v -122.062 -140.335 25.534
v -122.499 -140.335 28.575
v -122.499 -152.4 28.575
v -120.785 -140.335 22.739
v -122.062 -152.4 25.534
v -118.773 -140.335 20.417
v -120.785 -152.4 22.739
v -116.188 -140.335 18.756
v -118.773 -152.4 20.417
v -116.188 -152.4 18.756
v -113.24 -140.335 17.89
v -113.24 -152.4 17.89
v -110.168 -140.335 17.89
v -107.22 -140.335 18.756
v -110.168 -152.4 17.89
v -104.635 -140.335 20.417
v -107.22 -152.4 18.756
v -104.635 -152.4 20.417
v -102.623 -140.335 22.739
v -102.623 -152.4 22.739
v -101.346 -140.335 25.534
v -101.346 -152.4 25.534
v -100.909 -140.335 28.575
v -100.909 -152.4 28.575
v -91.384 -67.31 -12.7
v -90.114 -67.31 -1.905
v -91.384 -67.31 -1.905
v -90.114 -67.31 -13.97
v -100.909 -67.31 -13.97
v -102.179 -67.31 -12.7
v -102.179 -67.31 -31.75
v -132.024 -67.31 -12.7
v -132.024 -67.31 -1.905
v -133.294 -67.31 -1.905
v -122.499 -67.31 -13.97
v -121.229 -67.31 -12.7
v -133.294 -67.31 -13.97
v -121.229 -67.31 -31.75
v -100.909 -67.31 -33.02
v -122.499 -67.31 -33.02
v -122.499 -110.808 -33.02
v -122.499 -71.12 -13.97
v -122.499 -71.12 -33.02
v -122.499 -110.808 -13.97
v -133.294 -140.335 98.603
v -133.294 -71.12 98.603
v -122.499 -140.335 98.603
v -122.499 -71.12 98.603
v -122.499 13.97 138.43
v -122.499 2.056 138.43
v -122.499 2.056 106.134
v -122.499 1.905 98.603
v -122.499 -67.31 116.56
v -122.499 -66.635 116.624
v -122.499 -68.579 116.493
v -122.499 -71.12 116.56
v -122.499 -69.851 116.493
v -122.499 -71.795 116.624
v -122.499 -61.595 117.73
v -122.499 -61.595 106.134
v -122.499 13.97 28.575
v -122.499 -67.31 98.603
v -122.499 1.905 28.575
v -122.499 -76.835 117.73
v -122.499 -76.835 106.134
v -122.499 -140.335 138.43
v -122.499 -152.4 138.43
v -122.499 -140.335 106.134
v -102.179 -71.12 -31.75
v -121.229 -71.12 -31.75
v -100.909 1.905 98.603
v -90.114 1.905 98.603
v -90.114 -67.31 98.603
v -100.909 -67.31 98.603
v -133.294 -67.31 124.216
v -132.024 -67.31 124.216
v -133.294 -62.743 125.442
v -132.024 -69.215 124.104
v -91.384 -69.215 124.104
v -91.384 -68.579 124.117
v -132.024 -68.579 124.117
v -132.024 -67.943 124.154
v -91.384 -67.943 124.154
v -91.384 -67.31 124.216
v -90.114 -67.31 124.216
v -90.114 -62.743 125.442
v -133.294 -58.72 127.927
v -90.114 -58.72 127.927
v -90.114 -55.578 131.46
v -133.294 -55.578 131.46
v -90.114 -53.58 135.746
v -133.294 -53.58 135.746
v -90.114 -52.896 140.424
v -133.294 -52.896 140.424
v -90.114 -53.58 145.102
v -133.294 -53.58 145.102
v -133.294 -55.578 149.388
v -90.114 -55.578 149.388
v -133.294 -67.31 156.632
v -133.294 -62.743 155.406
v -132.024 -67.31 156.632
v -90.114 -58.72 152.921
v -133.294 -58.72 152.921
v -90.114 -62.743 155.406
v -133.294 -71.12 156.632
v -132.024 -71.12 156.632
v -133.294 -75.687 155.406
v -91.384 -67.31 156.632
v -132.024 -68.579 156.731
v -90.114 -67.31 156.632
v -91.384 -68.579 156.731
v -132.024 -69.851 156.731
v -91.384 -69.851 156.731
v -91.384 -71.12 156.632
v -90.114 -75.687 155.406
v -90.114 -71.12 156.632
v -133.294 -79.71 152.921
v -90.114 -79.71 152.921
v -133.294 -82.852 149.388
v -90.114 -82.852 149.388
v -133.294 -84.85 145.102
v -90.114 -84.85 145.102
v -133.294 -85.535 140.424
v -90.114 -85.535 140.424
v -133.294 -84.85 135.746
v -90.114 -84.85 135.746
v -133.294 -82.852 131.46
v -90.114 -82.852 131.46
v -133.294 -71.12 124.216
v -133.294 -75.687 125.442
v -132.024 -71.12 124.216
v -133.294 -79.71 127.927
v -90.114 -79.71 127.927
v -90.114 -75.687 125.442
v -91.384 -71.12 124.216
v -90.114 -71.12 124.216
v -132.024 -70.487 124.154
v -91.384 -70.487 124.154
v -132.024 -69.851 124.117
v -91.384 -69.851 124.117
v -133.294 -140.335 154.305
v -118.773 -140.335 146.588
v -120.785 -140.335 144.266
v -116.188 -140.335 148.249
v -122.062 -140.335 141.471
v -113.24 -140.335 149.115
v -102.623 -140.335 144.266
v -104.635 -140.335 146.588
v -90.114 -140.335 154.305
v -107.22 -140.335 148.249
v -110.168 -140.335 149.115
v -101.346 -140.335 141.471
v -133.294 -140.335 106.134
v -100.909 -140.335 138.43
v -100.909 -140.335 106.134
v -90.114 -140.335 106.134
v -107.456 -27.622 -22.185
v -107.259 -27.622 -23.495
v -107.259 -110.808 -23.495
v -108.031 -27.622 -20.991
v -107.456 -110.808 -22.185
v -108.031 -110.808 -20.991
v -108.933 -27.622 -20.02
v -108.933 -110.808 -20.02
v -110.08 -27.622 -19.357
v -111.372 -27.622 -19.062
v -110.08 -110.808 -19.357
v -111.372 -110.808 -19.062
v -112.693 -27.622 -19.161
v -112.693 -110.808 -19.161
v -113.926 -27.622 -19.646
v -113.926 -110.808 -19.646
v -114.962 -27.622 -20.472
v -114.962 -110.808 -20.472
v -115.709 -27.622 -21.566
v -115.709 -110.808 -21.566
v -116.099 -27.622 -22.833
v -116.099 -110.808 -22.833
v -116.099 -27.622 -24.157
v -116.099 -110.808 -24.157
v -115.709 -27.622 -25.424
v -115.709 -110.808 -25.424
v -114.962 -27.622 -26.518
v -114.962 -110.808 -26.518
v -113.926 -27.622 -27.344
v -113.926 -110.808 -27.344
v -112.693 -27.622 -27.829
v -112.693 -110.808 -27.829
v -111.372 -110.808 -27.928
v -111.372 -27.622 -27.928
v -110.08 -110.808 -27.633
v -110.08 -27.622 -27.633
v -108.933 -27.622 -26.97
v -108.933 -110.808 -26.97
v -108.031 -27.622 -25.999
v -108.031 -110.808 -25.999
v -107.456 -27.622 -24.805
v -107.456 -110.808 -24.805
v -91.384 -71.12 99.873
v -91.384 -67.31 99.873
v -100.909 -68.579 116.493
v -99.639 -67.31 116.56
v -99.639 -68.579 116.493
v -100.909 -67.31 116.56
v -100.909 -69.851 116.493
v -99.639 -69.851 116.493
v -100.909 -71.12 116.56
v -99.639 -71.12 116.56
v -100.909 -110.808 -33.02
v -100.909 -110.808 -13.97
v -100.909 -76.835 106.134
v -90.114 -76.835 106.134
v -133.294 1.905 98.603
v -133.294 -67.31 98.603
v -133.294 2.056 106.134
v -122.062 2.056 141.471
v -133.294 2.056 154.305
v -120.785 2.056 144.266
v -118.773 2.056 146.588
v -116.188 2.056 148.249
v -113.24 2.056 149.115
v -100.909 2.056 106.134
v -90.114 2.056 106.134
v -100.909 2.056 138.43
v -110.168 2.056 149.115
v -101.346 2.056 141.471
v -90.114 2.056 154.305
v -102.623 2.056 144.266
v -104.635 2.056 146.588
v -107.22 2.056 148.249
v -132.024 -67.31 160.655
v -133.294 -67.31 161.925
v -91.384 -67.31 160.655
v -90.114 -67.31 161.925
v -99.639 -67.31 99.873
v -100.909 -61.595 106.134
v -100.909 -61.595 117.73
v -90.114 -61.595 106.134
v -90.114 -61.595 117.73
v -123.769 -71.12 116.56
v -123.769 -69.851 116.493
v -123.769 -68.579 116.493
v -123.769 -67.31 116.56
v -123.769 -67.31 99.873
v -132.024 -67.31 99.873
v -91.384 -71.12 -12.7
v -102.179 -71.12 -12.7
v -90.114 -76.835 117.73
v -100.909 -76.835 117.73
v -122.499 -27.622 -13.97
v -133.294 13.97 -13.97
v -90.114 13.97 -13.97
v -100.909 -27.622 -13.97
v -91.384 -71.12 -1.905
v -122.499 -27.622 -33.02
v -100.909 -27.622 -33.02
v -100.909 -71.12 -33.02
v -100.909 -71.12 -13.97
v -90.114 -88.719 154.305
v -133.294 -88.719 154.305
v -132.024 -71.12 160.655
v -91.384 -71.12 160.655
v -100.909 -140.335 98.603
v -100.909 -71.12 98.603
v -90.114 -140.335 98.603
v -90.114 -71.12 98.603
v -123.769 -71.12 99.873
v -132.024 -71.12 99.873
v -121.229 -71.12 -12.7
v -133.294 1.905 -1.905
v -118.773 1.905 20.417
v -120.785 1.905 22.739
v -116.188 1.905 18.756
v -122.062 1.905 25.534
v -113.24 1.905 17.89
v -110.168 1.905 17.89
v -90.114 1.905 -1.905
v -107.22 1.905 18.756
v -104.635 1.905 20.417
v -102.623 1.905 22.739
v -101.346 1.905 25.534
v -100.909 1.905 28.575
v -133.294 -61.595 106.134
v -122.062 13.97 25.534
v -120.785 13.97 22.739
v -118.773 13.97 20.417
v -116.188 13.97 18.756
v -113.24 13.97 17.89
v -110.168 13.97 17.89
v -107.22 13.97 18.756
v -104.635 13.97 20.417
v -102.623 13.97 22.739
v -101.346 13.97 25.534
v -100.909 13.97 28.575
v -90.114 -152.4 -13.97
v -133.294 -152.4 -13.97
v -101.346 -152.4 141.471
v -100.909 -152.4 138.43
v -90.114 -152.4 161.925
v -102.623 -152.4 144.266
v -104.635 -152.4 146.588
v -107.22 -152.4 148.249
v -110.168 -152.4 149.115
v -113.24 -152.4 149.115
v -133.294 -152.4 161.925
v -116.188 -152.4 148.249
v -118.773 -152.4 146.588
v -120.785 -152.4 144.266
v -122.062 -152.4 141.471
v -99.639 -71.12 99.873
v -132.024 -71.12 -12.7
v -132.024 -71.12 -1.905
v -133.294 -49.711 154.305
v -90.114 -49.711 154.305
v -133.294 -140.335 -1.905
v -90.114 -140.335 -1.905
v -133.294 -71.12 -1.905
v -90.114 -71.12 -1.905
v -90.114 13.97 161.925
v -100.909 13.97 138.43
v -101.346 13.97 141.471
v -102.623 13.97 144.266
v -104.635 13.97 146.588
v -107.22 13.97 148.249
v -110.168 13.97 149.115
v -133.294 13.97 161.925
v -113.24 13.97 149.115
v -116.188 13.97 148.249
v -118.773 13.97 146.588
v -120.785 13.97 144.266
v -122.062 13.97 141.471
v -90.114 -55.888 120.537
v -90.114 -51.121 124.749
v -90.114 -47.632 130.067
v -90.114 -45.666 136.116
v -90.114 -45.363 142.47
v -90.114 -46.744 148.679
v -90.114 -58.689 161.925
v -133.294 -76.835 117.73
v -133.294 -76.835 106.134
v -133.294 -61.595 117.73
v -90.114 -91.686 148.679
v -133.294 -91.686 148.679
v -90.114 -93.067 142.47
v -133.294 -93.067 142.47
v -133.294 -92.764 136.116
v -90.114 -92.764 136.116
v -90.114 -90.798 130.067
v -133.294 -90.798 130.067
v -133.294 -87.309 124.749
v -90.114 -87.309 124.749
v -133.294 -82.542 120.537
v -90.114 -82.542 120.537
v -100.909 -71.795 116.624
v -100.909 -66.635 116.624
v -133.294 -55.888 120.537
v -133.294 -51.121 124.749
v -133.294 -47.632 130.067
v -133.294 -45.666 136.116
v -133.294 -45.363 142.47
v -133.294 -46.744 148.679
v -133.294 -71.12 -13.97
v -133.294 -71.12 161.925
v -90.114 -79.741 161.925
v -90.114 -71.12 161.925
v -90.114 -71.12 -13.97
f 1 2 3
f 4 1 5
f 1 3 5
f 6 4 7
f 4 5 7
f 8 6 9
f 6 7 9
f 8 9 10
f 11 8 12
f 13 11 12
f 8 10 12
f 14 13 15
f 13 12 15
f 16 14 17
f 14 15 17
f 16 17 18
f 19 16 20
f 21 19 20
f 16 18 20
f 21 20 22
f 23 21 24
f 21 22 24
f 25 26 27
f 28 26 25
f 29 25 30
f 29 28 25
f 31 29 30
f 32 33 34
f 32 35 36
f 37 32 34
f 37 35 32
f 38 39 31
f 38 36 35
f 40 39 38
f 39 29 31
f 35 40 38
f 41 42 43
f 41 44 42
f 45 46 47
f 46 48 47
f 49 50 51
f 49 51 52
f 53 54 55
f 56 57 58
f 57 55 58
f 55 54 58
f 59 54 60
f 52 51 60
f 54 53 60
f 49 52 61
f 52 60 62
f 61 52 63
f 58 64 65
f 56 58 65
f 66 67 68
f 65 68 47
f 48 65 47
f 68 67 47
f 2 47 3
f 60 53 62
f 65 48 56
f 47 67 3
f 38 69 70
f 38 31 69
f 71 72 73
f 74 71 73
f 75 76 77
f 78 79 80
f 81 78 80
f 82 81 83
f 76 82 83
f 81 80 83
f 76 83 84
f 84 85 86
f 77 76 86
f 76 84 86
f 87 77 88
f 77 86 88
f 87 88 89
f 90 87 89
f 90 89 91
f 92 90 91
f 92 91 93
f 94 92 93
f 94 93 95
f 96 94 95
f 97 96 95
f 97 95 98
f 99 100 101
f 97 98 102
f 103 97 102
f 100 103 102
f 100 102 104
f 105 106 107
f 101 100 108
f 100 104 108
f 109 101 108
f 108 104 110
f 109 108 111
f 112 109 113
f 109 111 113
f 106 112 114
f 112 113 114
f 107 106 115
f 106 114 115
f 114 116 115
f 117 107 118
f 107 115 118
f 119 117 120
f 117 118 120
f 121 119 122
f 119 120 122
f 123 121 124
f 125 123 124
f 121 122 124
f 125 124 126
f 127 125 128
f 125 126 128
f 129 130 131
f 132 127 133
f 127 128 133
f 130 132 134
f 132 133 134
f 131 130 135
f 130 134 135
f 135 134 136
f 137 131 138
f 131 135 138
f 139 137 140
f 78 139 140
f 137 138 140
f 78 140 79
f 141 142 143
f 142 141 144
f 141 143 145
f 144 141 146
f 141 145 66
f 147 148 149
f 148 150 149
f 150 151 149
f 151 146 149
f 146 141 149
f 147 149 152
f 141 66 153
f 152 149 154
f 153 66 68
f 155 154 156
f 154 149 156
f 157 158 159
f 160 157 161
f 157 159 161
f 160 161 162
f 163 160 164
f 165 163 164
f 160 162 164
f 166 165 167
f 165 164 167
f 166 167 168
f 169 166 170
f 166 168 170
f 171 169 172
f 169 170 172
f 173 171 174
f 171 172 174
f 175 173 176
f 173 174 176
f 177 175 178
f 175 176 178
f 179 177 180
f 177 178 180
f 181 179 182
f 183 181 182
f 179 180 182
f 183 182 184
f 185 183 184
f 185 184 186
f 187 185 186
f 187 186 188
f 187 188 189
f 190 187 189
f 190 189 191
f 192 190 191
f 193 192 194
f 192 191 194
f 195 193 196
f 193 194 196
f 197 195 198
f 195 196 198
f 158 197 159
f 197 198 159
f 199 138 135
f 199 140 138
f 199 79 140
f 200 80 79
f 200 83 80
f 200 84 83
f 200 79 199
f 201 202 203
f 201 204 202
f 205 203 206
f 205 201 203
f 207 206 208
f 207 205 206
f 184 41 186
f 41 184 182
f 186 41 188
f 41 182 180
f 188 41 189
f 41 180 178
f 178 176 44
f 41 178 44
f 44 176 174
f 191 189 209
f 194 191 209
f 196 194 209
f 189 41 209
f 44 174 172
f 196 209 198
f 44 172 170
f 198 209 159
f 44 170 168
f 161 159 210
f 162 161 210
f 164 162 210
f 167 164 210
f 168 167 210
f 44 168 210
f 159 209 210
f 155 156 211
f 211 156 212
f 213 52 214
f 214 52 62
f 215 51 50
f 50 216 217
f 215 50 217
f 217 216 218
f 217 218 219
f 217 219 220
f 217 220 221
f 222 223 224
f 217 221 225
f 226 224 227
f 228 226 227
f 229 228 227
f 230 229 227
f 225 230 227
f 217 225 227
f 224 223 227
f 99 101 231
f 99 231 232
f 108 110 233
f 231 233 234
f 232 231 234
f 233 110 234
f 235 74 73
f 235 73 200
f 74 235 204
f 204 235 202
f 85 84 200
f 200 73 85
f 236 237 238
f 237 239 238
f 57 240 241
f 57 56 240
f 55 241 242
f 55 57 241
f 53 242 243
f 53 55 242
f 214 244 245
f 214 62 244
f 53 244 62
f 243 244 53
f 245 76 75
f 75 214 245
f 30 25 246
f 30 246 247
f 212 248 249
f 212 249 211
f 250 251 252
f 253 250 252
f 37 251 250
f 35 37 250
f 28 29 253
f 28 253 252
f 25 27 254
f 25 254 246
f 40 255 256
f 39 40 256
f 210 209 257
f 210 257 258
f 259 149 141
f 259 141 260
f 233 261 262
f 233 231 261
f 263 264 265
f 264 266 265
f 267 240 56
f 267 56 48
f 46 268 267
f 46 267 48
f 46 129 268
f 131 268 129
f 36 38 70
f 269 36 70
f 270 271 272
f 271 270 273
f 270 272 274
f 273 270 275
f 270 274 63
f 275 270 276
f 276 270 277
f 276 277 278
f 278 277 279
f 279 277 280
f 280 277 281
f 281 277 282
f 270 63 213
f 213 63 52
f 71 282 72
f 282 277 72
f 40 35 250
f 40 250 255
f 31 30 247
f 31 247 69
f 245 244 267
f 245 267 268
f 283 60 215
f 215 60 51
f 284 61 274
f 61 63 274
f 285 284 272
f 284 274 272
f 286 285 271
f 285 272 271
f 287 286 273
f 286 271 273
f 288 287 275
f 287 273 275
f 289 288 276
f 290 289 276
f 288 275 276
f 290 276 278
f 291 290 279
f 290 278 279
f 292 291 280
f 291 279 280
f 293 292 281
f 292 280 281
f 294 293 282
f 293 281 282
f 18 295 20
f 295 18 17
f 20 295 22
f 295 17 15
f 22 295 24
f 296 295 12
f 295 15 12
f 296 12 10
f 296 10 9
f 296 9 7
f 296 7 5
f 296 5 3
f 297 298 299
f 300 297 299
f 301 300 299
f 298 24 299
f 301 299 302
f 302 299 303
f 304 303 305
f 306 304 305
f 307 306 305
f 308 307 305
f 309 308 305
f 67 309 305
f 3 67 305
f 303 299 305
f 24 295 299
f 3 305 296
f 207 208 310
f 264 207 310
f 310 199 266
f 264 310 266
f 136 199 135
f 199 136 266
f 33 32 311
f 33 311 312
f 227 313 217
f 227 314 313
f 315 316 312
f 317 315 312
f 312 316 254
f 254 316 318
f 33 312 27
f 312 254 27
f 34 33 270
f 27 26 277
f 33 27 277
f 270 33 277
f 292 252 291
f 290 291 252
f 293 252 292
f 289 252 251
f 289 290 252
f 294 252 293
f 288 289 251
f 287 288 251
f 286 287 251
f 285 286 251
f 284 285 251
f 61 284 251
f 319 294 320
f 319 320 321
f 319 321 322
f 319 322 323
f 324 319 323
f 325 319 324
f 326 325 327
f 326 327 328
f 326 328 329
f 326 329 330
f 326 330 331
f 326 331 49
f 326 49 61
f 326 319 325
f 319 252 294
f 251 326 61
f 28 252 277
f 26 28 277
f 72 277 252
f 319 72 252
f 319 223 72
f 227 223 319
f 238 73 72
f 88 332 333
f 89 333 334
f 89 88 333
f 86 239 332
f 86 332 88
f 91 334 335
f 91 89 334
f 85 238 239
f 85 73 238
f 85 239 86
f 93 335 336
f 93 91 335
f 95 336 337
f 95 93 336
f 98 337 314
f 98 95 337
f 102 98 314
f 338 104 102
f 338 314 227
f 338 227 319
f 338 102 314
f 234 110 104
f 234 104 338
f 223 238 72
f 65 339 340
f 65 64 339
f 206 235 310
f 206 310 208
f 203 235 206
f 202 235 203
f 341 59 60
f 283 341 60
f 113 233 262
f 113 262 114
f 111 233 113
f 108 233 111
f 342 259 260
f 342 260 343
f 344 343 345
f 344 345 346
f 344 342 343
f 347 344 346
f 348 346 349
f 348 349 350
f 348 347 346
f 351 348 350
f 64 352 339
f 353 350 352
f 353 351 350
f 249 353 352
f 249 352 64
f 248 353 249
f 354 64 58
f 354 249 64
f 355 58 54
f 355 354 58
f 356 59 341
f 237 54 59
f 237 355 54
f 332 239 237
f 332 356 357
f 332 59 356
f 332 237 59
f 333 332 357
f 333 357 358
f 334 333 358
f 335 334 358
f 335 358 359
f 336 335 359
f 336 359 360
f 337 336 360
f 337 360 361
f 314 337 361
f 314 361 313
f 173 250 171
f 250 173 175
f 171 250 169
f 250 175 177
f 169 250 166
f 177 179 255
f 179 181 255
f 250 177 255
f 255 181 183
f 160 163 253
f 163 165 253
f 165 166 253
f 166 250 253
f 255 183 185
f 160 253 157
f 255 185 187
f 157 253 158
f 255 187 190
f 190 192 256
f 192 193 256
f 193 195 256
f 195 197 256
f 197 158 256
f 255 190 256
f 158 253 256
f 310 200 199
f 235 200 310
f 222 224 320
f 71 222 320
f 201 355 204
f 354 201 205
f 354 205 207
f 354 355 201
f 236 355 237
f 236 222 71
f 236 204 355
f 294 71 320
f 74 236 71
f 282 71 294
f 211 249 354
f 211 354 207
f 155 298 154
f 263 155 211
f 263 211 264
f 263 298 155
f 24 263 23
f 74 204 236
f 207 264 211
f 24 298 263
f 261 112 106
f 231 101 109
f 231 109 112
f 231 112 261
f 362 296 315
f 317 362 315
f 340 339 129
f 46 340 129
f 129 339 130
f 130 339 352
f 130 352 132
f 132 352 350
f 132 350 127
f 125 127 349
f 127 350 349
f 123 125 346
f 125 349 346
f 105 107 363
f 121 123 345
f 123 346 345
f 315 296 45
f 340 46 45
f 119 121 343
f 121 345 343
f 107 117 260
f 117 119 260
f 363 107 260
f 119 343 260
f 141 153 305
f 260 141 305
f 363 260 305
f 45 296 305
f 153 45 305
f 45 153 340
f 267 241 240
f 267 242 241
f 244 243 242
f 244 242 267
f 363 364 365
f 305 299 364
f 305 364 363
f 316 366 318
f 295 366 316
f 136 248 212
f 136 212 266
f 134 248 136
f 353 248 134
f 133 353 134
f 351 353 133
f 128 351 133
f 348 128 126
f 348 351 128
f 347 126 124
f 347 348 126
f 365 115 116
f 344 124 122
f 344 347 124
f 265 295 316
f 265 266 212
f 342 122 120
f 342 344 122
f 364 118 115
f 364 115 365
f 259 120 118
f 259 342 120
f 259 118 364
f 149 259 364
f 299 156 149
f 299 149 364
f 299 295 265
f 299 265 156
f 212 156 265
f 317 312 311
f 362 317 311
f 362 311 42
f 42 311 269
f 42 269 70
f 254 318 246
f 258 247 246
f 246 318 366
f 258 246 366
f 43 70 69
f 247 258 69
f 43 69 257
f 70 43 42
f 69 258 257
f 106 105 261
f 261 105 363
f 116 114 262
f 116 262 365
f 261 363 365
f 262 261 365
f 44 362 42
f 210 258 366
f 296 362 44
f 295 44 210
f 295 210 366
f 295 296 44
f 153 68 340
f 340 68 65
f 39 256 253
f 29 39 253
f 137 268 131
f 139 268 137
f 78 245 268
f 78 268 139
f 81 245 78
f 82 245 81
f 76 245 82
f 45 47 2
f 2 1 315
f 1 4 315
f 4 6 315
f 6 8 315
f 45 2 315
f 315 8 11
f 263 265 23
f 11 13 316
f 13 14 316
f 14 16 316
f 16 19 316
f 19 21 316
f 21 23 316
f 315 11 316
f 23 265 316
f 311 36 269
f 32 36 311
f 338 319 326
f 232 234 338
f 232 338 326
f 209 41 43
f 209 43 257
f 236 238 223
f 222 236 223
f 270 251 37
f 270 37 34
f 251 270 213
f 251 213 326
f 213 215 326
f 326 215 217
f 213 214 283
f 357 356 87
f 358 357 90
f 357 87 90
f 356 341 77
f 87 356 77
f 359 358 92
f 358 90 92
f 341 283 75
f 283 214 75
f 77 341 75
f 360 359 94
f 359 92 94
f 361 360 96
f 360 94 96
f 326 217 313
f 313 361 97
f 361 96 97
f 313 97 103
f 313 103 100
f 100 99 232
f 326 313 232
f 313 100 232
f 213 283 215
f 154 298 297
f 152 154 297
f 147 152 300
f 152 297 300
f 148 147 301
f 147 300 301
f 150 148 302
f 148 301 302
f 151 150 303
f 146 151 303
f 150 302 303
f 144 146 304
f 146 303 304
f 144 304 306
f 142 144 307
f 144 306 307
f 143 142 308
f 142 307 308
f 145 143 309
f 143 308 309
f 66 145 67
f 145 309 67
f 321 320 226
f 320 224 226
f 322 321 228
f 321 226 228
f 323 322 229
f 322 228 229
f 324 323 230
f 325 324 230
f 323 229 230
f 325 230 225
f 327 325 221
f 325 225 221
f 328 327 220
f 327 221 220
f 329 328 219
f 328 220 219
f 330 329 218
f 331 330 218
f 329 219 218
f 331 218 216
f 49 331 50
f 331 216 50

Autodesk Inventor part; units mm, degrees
ref_plane "YZ Plane" through (0, 0, 0) normal (1, 0, 0) x (0, 1, 0)
ref_plane "XZ Plane" through (0, 0, 0) normal (0, 1, 0) x (-1, 0, 0)
ref_plane "XY Plane" through (0, 0, 0) normal (0, 0, 1) x (1, 0, 0)
sketch "Sketch1" plane through (0, 0, 0) normal (0, 1, 0) x (-1, 0, 0)
  line L0 (920.75, 0) -> (0, 0)
  line L1 (0, 0) -> (920.75, 0)
  line L2 (-297.6389, 409.8513) -> (2710.7909, 409.8513) construction
  line L3 (2710.7909, 409.8513) -> (2710.7909, -1716.9746) construction
  line L4 (2710.7909, -1716.9746) -> (-297.6389, -1716.9746) construction
  line L5 (-297.6389, -1716.9746) -> (-297.6389, 409.8513) construction
  line L6 (0, 0) -> (920.75, 0)
  line L7 (920.75, 0) -> (920.75, 100.33)
  line L8 (0, 100.33) -> (920.75, 100.33)
  line L9 (0, 0) -> (0, 100.33)
  line L10 (0, 100.33) -> (0, 120.65)
  line L11 (0, 120.65) -> (920.75, 120.65)
  line L12 (920.75, 120.65) -> (920.75, 100.33)
  line L13 (0, 120.65) -> (0, 196.85)
  line L14 (920.75, 196.85) -> (920.75, 120.65)
  line L15 (477.9962, 0) -> (477.9962, -13.97)
  line L16 (477.9962, -13.97) -> (434.8162, -13.97)
  line L17 (434.8162, -13.97) -> (434.8162, 0)
  line L18 (133.294, 0) -> (133.294, -13.97)
  line L19 (133.294, -13.97) -> (90.114, -13.97)
  line L20 (90.114, -13.97) -> (90.114, 0)
  line L21 (769.0257, 0) -> (769.0257, -13.97)
  line L22 (769.0257, -13.97) -> (812.2057, -13.97)
  line L23 (812.2057, -13.97) -> (812.2057, 0)
  line L24 (434.8162, -13.97) -> (477.9962, -13.97)
  line L25 (769.0257, -13.97) -> (812.2057, -13.97)
  line L26 (90.114, -13.97) -> (133.294, -13.97)
  line L27 (90.114, -13.97) -> (111.704, -13.97)
  line L28 (111.704, -13.97) -> (100.909, -13.97)
  line L29 (100.909, -13.97) -> (122.499, -13.97)
  line L30 (122.499, -13.97) -> (122.499, -33.02)
  line L31 (122.499, -33.02) -> (100.909, -33.02)
  line L32 (100.909, -33.02) -> (100.909, -13.97)
  line L33 (434.8162, -13.97) -> (456.4062, -13.97)
  line L34 (456.4062, -13.97) -> (445.6112, -13.97)
  line L35 (445.6112, -13.97) -> (467.2012, -13.97)
  line L36 (467.2012, -13.97) -> (467.2012, -33.02)
  line L37 (467.2012, -33.02) -> (445.6112, -33.02)
  line L38 (445.6112, -33.02) -> (445.6112, -13.97)
  line L39 (769.0257, -13.97) -> (790.6157, -13.97)
  line L40 (790.6157, -13.97) -> (779.8207, -13.97)
  line L41 (779.8207, -13.97) -> (801.4107, -13.97)
  line L42 (801.4107, -13.97) -> (801.4107, -33.02)
  line L43 (801.4107, -33.02) -> (779.8207, -33.02)
  line L44 (779.8207, -33.02) -> (779.8207, -13.97)
  line L45 (434.8162, 0) -> (413.2262, 0)
  line L46 (413.2262, 0) -> (413.2262, -11.43)
  line L47 (413.2262, -11.43) -> (371.9512, -11.43)
  line L48 (371.9512, -11.43) -> (371.9512, 64.77)
  arc A0 (413.2262, 72.0379) -> (371.9512, 72.0379) centre (392.5887, 68.404) ccw
  line L49 (413.2262, 0) -> (413.2262, 64.77)
  line L50 (371.9512, 64.77) -> (371.9512, 72.0379)
  line L51 (413.2262, 64.77) -> (413.2262, 72.0379)
  line L52 (434.8162, -13.97) -> (434.8162, 202.565)
  line L53 (477.9962, -13.97) -> (477.9962, 202.565)
  line L54 (769.0257, -13.97) -> (769.0257, 202.565)
  line L55 (812.2057, -13.97) -> (812.2057, 202.565)
  line L56 (812.2057, 202.565) -> (769.0257, 202.565)
  line L57 (477.9962, 202.565) -> (434.8162, 202.565)
  line L58 (133.294, -13.97) -> (133.294, 182.245)
  line L59 (90.114, -13.97) -> (90.114, 182.245)
  line L60 (90.114, 182.245) -> (133.294, 182.245)
  line L61 (67.3834, 182.245) -> (164.6776, 182.245)
  line L62 (413.2262, 202.565) -> (508.4774, 202.565)
  line L63 (745.5808, 202.565) -> (847.3717, 202.565)
  line L64 (67.3834, 161.925) -> (164.6776, 161.925)
  line L65 (413.2262, 182.245) -> (508.4774, 182.245)
  line L66 (745.5808, 182.245) -> (847.3717, 182.245)
  line L67 (133.294, -13.97) -> (133.294, 78.74)
  line L68 (133.294, 78.74) -> (434.8162, 78.74)
  line L69 (133.294, -13.97) -> (133.294, 26.67)
  line L70 (133.294, 26.67) -> (371.9512, 26.67)
  line L71 (133.294, 26.67) -> (298.394, 26.67)
  line L72 (298.394, 26.67) -> (317.7759, 78.74)
  line L73 (133.294, 78.74) -> (133.294, 59.055)
  line L74 (133.294, 59.055) -> (310.4486, 59.055)
  point P0 (133.294, 161.925)
  point P1 (90.114, 161.925)
  dimension "d0" = 920.75
  dimension "d1" = 20.32
  dimension "d2" = 76.2
  dimension "d3" = 13.97
  dimension "d4" = 43.18
  dimension "d5" = 13.97
  dimension "d6" = 43.18
  dimension "d7" = 13.97
  dimension "d8" = 13.97
  dimension "d9" = 43.18
  dimension "d10" = 21.59
  dimension "d11" = 19.05
  dimension "d12" = 21.59
  dimension "d13" = 19.05
  dimension "d14" = 21.59
  dimension "d15" = 19.05
  dimension "d16" = 21.59
  dimension "d17" = 11.43
  dimension "d18" = 41.275
  dimension "d19" = 76.2
  dimension "d20" = 20.955
  dimension "d21" = 216.535
  dimension "d22" = 216.535
  dimension "d23" = 216.535
  dimension "d24" = 216.535
  dimension "d25" = 196.215
  dimension "d26" = 20.32
  dimension "d27" = 20.32
  dimension "d28" = 20.32
  dimension "d29" = 92.71
  dimension "d30" = 40.64
  dimension "d31" = 165.1
  dimension "d32" = 19.685
extrude "Extrusion1" add sketch "Sketch1" along normal blind 13.97 and the other way blind 152.4 contours L58 L0 L59 L8 | L8 L59 L11 L58 | L18 L19 L20 L0 | L11 L59 L64 L58 | L30 L31 L32 L19
sketch "Sketch2" plane through (-90.114, -152.4, -13.97) normal (1, 0, 0) x (0, 0, -1)
  line L0 (0, 0) -> (0, 166.37) projected
  line L1 (-175.895, 166.37) -> (0, 166.37) projected
  line L2 (-175.895, 166.37) -> (-175.895, 0) projected
  line L3 (0, 0) -> (-175.895, 0) projected
  line L4 (-13.97, 152.4) -> (-13.97, 13.97)
  line L5 (-13.97, 13.97) -> (-161.925, 13.97)
  line L6 (-161.925, 13.97) -> (-161.925, 152.4)
  line L7 (-161.925, 152.4) -> (-13.97, 152.4)
  line L8 (-12.065, 12.065) -> (-12.065, 154.305)
  line L9 (-12.065, 154.305) -> (-163.83, 154.305)
  line L10 (-163.83, 154.305) -> (-163.83, 12.065)
  line L11 (-163.83, 12.065) -> (-12.065, 12.065)
  line L12 (-12.065, 70.3973) -> (-112.5728, 70.3973)
  line L13 (-112.5728, 70.3973) -> (-112.5728, 191.5999)
  line L14 (-112.5728, 70.3973) -> (-112.5728, -17.578)
  circle A0 centre (-150.6728, 83.185) radius 38.1
  line L15 (0, 0) -> (19.05, 0) projected
  line L16 (0, 0) -> (0, 83.185)
  line L17 (0, 0) -> (0, 166.37) projected
  line L18 (19.05, 166.37) -> (0, 166.37) projected
  line L19 (0, 166.37) -> (0, 83.185)
  line L20 (0, 124.7775) -> (67.1734, 124.7775)
  line L21 (67.1734, 124.7775) -> (67.1734, 184.1281)
  line L22 (67.1734, 184.1281) -> (0, 184.1281)
  line L23 (0, 184.1281) -> (0, 124.7775)
  line L24 (19.05, 0) -> (19.05, 166.37) projected
  line L25 (19.05, 0) -> (19.05, 83.185)
  line L26 (19.05, 41.5925) -> (0, 41.5925)
  line L27 (0, 41.5925) -> (0, -34.1667)
  line L28 (0, -34.1667) -> (19.05, -34.1667)
  line L29 (19.05, -34.1667) -> (19.05, 41.5925)
  point P0 (-13.97, 152.4)
  point P1 (-112.5728, 12.065)
  point P2 (-112.5728, 154.305)
  dimension "d39" = 13.97
  dimension "d40" = 1.905
  dimension "d41" = 100.5078
extrude "Extrusion2" cut sketch "Sketch2" against normal through all contours L0 L26 L24 L15 | L15 L29 L28 L27 | L14 L5 L4 L12 L8 L11 | L0 L18 L24 L20 | L14 L12 L4 L5 | L23 L22 L21 L20 L24 L18 | L12 L4 L7 L13 L9 L8 | L13 L7 L4 L12
sketch "Sketch3" plane through (-90.114, -152.4, -13.97) normal (1, 0, 0) x (0, 0, -1)
  line L0 (-196.2151, 166.37) -> (-196.2151, 0)
  line L1 (-12.0651, 154.305) -> (-112.5729, 154.305)
  line L2 (-12.0651, 12.065) -> (-12.0651, 154.305)
  line L3 (-0.0001, 0) -> (-0.0001, 166.37)
  line L4 (-112.5729, 12.065) -> (-12.0651, 12.065)
  line L5 (-0.0001, 166.37) -> (-196.2151, 166.37)
  line L6 (-196.2151, 0) -> (-0.0001, 0)
  line L7 (-112.5729, 154.305) -> (-112.5729, 12.065)
  line L8 (-120.104, 12.065) -> (-120.104, 52.9441)
  circle A0 centre (-154.394, 83.185) radius 38.1
  arc A1 (-188.684, 52.9441) -> (-120.104, 52.9441) centre (-154.394, 83.185) ccw
  line L9 (-188.684, 52.9441) -> (-188.684, 12.065)
  line L10 (-188.684, 12.065) -> (-120.104, 12.065)
  line L11 (-42.5451, 166.37) -> (-42.5451, 154.305)
  line L12 (-120.104, 113.4259) -> (-120.104, 154.4562)
  arc A2 (-120.104, 113.4259) -> (-188.684, 113.4259) centre (-154.394, 83.185) ccw
  line L13 (-188.684, 154.4562) -> (-188.684, 113.4259)
  line L14 (-120.104, 154.4562) -> (-188.684, 154.4562)
  circle A3 centre (-154.394, 83.185) radius 16.3195
  point P0 (-182.2451, 152.4)
  point P1 (-13.9701, 152.4)
  dimension "d46" = 32.639
extrude "Extrusion3" cut sketch "Sketch3" against normal through all contours A3
sketch "Sketch4" plane through (-90.114, -152.4, -13.97) normal (1, 0, 0) x (0, 0, -1)
  line L0 (-196.2151, 166.37) -> (-196.2151, 0)
  line L1 (-120.104, 113.4259) -> (-120.104, 154.4562)
  line L2 (-120.104, 12.065) -> (-120.104, 52.9441)
  line L3 (-120.104, 154.4562) -> (-188.684, 154.4562)
  line L4 (-188.684, 154.4562) -> (-188.684, 113.4259)
  line L5 (-188.684, 52.9441) -> (-188.684, 12.065)
  line L6 (-188.684, 12.065) -> (-120.104, 12.065)
  line L7 (-12.0651, 154.305) -> (-112.5729, 154.305)
  line L8 (-12.0651, 12.065) -> (-12.0651, 154.305)
  line L9 (-112.5729, 154.305) -> (-112.5729, 12.065)
  line L10 (-0.0001, 166.37) -> (-196.2151, 166.37)
  line L11 (-196.2151, 0) -> (-0.0001, 0)
  line L12 (-112.5729, 12.065) -> (-12.0651, 12.065)
  line L13 (-42.5451, 166.37) -> (-42.5451, 154.305)
  line L14 (-0.0001, 0) -> (-0.0001, 166.37)
  circle A0 centre (-154.394, 83.185) radius 16.3195
  circle A1 centre (-154.394, 83.185) radius 23.9395
  circle A2 centre (-154.394, 83.185) radius 16.3195 projected
  line L15 (-138.0745, 83.185) -> (-107.0212, 83.185)
  line L16 (-138.0745, 90.805) -> (-107.0212, 90.805)
  line L17 (-138.0745, 75.565) -> (-107.0212, 75.565)
  line L18 (-138.0745, 75.565) -> (-139.9627, 75.565)
  line L19 (-138.0745, 90.805) -> (-139.9627, 90.805)
  circle A3 centre (-154.394, 83.185) radius 16.3195 projected
  line L20 (-12.065, 12.065) -> (-112.5728, 12.065) projected
  line L21 (-112.5728, 12.065) -> (-112.5728, 154.305) projected
  line L22 (-112.5728, 154.305) -> (-12.065, 154.305) projected
  line L23 (-12.065, 154.305) -> (-12.065, 12.065) projected
  line L24 (0, 0) -> (0, 166.37) projected
  line L25 (-175.895, 166.37) -> (0, 166.37) projected
  line L26 (-175.895, 166.37) -> (-175.895, 0) projected
  line L27 (0, 0) -> (-175.895, 0) projected
  line L28 (-175.895, -12.7057) -> (-175.895, 174.9983)
  line L29 (-168.275, -12.7057) -> (-168.275, 174.9983)
  line L30 (-120.104, 52.9441) -> (-120.104, 113.4259)
  point P0 (-13.97, 152.4)
  point P1 (-182.2451, 152.4)
  point P2 (-13.9701, 152.4)
  point P3 (-168.275, 154.4562)
  point P4 (-168.275, 102.6893)
  point P5 (-131.6996, 90.805)
  point P6 (-120.104, 90.805)
  point P7 (-120.104, 75.565)
  point P8 (-131.6996, 75.565)
  point P9 (-168.275, 63.6807)
  point P10 (-168.275, 12.065)
  dimension "d49" = 32.639
  dimension "d50" = 47.879
  dimension "d51" = 7.62
  dimension "d52" = 7.62
  dimension "d53" = 7.62
extrude "Extrusion4" cut sketch "Sketch4" against normal through all contours L3 L1 L30 L16 A1 L29 | L29 A1 L17 L30 L2 L6
sketch "Sketch5" plane through (0, -152.4, 0) normal (0, -1, 0) x (1, 0, 0)
  line L0 (-90.114, -13.97) -> (-133.294, -13.97) projected
  line L1 (-111.704, -13.97) -> (-111.704, 17.78)
  line L2 (-133.294, 161.925) -> (-90.114, 161.925) projected
  line L3 (-111.704, 161.925) -> (-111.704, 149.225)
  circle A0 centre (-111.704, 28.575) radius 10.795
  circle A1 centre (-111.704, 138.43) radius 10.795
  line L4 (-90.114, -13.97) -> (-90.114, 161.925) projected
  line L5 (-122.499, 143.9608) -> (-122.499, 4.5606)
  line L6 (-100.909, 151.8855) -> (-100.909, 12.2046)
  point P0 (0, 0)
  point P1 (-122.499, 138.43)
  point P2 (-122.499, 28.575)
  point P3 (-100.909, 28.575)
  point P4 (-100.909, 138.43)
  dimension "d0" = 920.75
  dimension "d56" = 31.75
  dimension "d57" = 12.7
  dimension "d60" = 21.59
  dimension "d61" = 42.545
  dimension "d62" = 21.59
  dimension "d63" = 21.59
  dimension "d64" = 21.59
  dimension "d65" = 23.495
extrude "Extrusion5" cut sketch "Sketch5" against normal through all contours A0 | A0 L5 A1 L6 | A1
sketch "Sketch6" plane through (-90.114, -152.4, -13.97) normal (1, 0, 0) x (0, 0, -1)
  circle A0 centre (-154.394, 83.185) radius 16.3195 projected
  circle A1 centre (-154.394, 83.185) radius 23.9395
  circle A2 centre (-154.394, 83.185) radius 16.3195
  line L0 (-175.895, 166.37) -> (-175.895, 0) projected
  line L1 (-175.895, 72.6586) -> (-175.895, 93.7114)
  point P0 (-13.97, 152.4)
  dimension "d68" = 32.639
extrude "Extrusion6" add sketch "Sketch6" against normal blind 34.29 contours A1 L0 picked at (-174.1678, 83.185)
sketch "Sketch7" plane through (-122.499, -110.8075, -13.97) normal (0, -1, 0) x (1, 0, 0)
  line L0 (21.59, -19.05) -> (0, -19.05) projected
  line L1 (0, -19.05) -> (21.59, -19.05)
  line L2 (21.59, -19.05) -> (21.59, 0)
  line L3 (-10.795, 0) -> (32.385, 0) projected
  circle A0 centre (10.795, -9.525) radius 4.445
  point P0 (122.499, 13.97)
  dimension "d71" = 8.89
extrude "Extrusion7" cut sketch "Sketch7" against normal through all
sketch "Sketch8" plane through (-133.294, 13.97, 161.925) normal (0, 0, 1) x (1, 0, 0)
  line L0 (32.385, -11.9138) -> (32.385, -75.565) projected
  line L1 (0, -166.37) -> (0, 0) projected
  line L2 (43.18, 0) -> (43.18, -166.37) projected
  line L3 (0, 0) -> (43.18, 0) projected
  line L4 (0, -166.37) -> (0, 0) projected
  line L5 (43.18, -166.37) -> (0, -166.37) projected
  line L6 (0, -154.305) -> (0, -12.065) projected
  line L7 (0, -83.185) -> (85.68, -83.185)
  line L8 (0, -81.28) -> (85.68, -81.28)
  line L9 (0, -85.09) -> (85.68, -85.09)
  point P0 (133.294, -13.97)
  point P1 (43.18, -85.09)
  point P2 (43.18, -81.28)
  dimension "d74" = 1.905
  dimension "d75" = 1.905
extrude "Extrusion8" cut sketch "Sketch8" against normal blind 1.27 contours L1 L7 L2 L9 | L1 L8 L2 L7
sketch "Sketch9" plane through (-90.114, -152.4, -13.97) normal (1, 0, 0) x (0, 0, -1)
  line L0 (-175.895, 81.28) -> (-174.625, 81.28) projected
  line L1 (-175.26, 81.28) -> (-168.3969, 81.28)
  line L2 (-168.3969, 81.28) -> (-168.3969, 85.09)
  line L3 (-168.3969, 85.09) -> (-175.26, 85.09)
  line L4 (-175.26, 85.09) -> (-175.26, 81.28)
  point P0 (-13.97, 152.4)
extrude "Extrusion9" cut sketch "Sketch9" against normal blind 1.27
sketch "Sketch10" plane through (-133.294, -152.4, -13.97) normal (-1, 0, 0) x (0, 0, 1)
  line L0 (175.895, 81.28) -> (174.625, 81.28) projected
  line L1 (175.26, 81.28) -> (168.0363, 81.28)
  line L2 (168.0363, 81.28) -> (168.0363, 85.09)
  line L3 (168.0363, 85.09) -> (175.26, 85.09)
  line L4 (175.26, 85.09) -> (175.26, 81.28)
  point P0 (13.97, 152.4)
extrude "Extrusion10" cut sketch "Sketch10" against normal blind 1.27
sketch "Sketch11" plane through (-122.499, -110.8075, -33.02) normal (-1, 0, 0) x (0, 0, 1)
  line L0 (19.05, 83.185) -> (0, 83.185) projected
  line L1 (0, 0) -> (0, 83.185) projected
  line L2 (0, 0) -> (19.05, 0) projected
  line L3 (19.05, 0) -> (19.05, 83.185) projected
  line L4 (0, 0) -> (0, 83.185) projected
  line L5 (0, 41.5925) -> (46.553, 41.5925)
  line L6 (0, 39.6875) -> (46.553, 39.6875)
  line L7 (0, 43.4975) -> (46.553, 43.4975)
  point P0 (33.02, 110.8075)
  point P1 (19.05, 43.4975)
  point P2 (0, 43.4975)
  point P3 (0, 39.6875)
  point P4 (19.05, 39.6875)
  dimension "d82" = 1.905
  dimension "d83" = 1.905
extrude "Extrusion11" cut sketch "Sketch11" against normal blind 1.27 contours L3 L5 L1 L7 | L3 L6 L1 L5
sketch "Sketch12" plane through (-133.294, -152.4, -13.97) normal (-1, 0, 0) x (0, 0, 1)
  line L0 (-19.05, 85.09) -> (0, 85.09) projected
  line L1 (-1.3457, 85.09) -> (16.2492, 85.09)
  line L2 (16.2492, 85.09) -> (16.2492, 81.28)
  line L3 (16.2492, 81.28) -> (-1.3457, 81.28)
  line L4 (-1.3457, 81.28) -> (-1.3457, 85.09)
  point P0 (13.97, 152.4)
extrude "Extrusion12" cut sketch "Sketch12" against normal blind 1.27
sketch "Sketch13" plane through (-90.114, 13.97, -13.97) normal (0, 0, -1) x (-1, 0, 0)
  line L0 (0, -85.09) -> (43.18, -85.09) projected
  line L1 (42.667, -85.09) -> (-4.3743, -85.09)
  line L2 (-4.3743, -85.09) -> (-4.3743, -81.28)
  line L3 (-4.3743, -81.28) -> (42.667, -81.28)
  line L4 (42.667, -81.28) -> (42.667, -85.09)
  line L5 (31.115, -81.28) -> (31.115, -85.09) projected
  line L6 (31.115, -85.09) -> (31.115, -81.28)
  line L7 (10.795, -124.7775) -> (10.795, -41.5925) projected
  line L8 (10.795, -85.09) -> (10.795, -81.28)
  point P0 (-90.114, -13.97)
extrude "Extrusion13" cut sketch "Sketch13" against normal blind 1.27 contours L1 L2 L3 L7 L0 | L5 L3 L4 L0
sketch "Sketch14" plane through (-100.909, -27.6225, -33.02) normal (0, 0, -1) x (-1, 0, 0)
  line L0 (32.385, -43.4975) -> (21.59, -43.4975) projected
  line L1 (32.385, -39.6875) -> (-10.795, -39.6875) projected
  line L2 (21.9999, -43.4975) -> (-3.8997, -43.4975)
  line L3 (-3.8997, -43.4975) -> (-3.8997, -39.6875)
  line L4 (-3.8997, -39.6875) -> (21.9999, -39.6875)
  line L5 (21.9999, -39.6875) -> (21.9999, -43.4975)
  point P0 (-100.909, 27.6225)
extrude "Extrusion14" cut sketch "Sketch14" against normal blind 1.27
sketch "Sketch15" plane through (-100.909, -27.6225, -13.97) normal (1, 0, 0) x (0, 0, -1)
  line L0 (-12.065, -43.4975) -> (0, -43.4975) projected
  line L1 (-0.6678, -43.4975) -> (23.2828, -43.4975)
  line L2 (23.2828, -43.4975) -> (23.2828, -39.6875)
  line L3 (23.2828, -39.6875) -> (-0.6678, -39.6875)
  line L4 (-0.6678, -39.6875) -> (-0.6678, -43.4975)
  line L5 (-1.27, -43.4975) -> (-1.27, -39.6875) projected
  line L6 (19.05, -39.6875) -> (0, -39.6875) projected
  line L7 (-1.27, -43.4975) -> (8.5133, -43.4975)
  line L8 (8.5133, -43.4975) -> (8.5133, -39.6875)
  line L9 (8.5133, -39.6875) -> (-1.27, -39.6875)
  line L10 (-1.27, -39.6875) -> (-1.27, -43.4975)
  point P0 (-13.97, 27.6225)
extrude "Extrusion15" cut sketch "Sketch15" against normal blind 1.27
sketch "Sketch16" plane through (-90.114, 13.97, 161.925) normal (1, 0, 0) x (0, 0, -1)
  line L0 (194.945, -81.28) -> (175.895, -81.28) projected
  line L1 (177.3654, -81.28) -> (158.7871, -81.28)
  line L2 (158.7871, -81.28) -> (158.7871, -85.09)
  line L3 (158.7871, -85.09) -> (177.3654, -85.09)
  line L4 (177.3654, -85.09) -> (177.3654, -81.28)
  point P0 (161.925, -13.97)
extrude "Extrusion16" cut sketch "Sketch16" against normal blind 1.27
sketch "Sketch17" plane through (-133.294, -152.4, -13.97) normal (-1, 0, 0) x (0, 0, 1)
  line L0 (12.065, 85.09) -> (1.27, 85.09) projected
  line L1 (170.6019, 81.28) -> (175.895, 81.28) projected
  line L2 (4.2707, 85.09) -> (173.2485, 85.09)
  line L3 (173.2485, 85.09) -> (173.2485, 81.28)
  line L4 (173.2485, 81.28) -> (4.2707, 81.28)
  line L5 (4.2707, 81.28) -> (4.2707, 85.09)
  line L6 (142.9288, 85.09) -> (98.9205, 85.09)
  line L7 (98.9205, 85.09) -> (98.9205, 81.28)
  line L8 (98.9205, 81.28) -> (142.9288, 81.28)
  line L9 (142.9288, 81.28) -> (142.9288, 85.09)
  point P0 (13.97, 152.4)
extrude "Extrusion17" cut sketch "Sketch17" against normal blind 1.27 contours L2 L9 L4 L7
sketch "Sketch18" plane through (-90.114, 13.97, 161.925) normal (1, 0, 0) x (0, 0, -1)
  line L0 (175.895, -81.28) -> (163.83, -81.28) projected
  line L1 (0, -85.09) -> (5.2931, -85.09) projected
  line L2 (169.8625, -81.28) -> (3.2831, -81.28)
  line L3 (3.2831, -81.28) -> (3.2831, -85.09)
  line L4 (3.2831, -85.09) -> (169.8625, -85.09)
  line L5 (169.8625, -85.09) -> (169.8625, -81.28)
  line L6 (27.0349, -85.09) -> (70.2725, -85.09)
  line L7 (70.2725, -85.09) -> (70.2725, -81.28)
  line L8 (70.2725, -81.28) -> (27.0349, -81.28)
  line L9 (27.0349, -81.28) -> (27.0349, -85.09)
  point P0 (161.925, -13.97)
extrude "Extrusion18" cut sketch "Sketch18" against normal blind 1.27 contours L7 L4 L9 L2
sketch "Sketch19" plane through (-122.499, 1.905, 98.6028) normal (0, 0, -1) x (-1, 0, 0)
  line L0 (9.525, -69.215) -> (10.795, -69.215) projected
  line L1 (-31.115, -73.025) -> (-32.385, -73.025) projected
  line L2 (10.795, -69.215) -> (-32.385, -69.215)
  line L3 (-32.385, -69.215) -> (-32.385, -73.025)
  line L4 (-32.385, -73.025) -> (10.795, -73.025)
  line L5 (10.795, -73.025) -> (10.795, -69.215)
  point P0 (-122.499, -1.905)
extrude "Extrusion19" cut sketch "Sketch19" against normal blind 1.27
sketch "Sketch20" plane through (-100.909, -152.4, 28.575) normal (-1, 0, 0) x (0, 0, 1)
  line L0 (70.0278, 85.09) -> (71.2978, 85.09) projected
  line L1 (71.2978, 85.09) -> (71.2978, 81.28) projected
  line L2 (71.2978, 81.28) -> (70.0278, 81.28) projected
  line L3 (70.0278, 12.065) -> (70.0278, 81.28) projected
  line L4 (0, 12.065) -> (70.0278, 12.065) projected
  line L5 (0, 0) -> (0, 12.065) projected
  line L6 (109.855, 0) -> (0, 0) projected
  line L7 (109.855, 0) -> (109.855, 12.065) projected
  line L8 (77.559, 12.065) -> (109.855, 12.065) projected
  line L9 (77.559, 75.565) -> (77.559, 12.065) projected
  line L10 (89.1546, 75.565) -> (77.559, 75.565) projected
  arc A0 (89.1546, 90.805) -> (89.1546, 75.565) centre (111.849, 83.185) ccw projected
  line L11 (77.559, 90.805) -> (89.1546, 90.805) projected
  line L12 (77.559, 154.4562) -> (77.559, 90.805) projected
  line L13 (109.855, 154.4562) -> (77.559, 154.4562) projected
  line L14 (109.855, 154.4562) -> (109.855, 166.37) projected
  line L15 (0, 166.37) -> (109.855, 166.37) projected
  line L16 (0, 154.305) -> (0, 166.37) projected
  line L17 (70.0278, 154.305) -> (0, 154.305) projected
  line L18 (70.0278, 85.09) -> (70.0278, 154.305) projected
  line L19 (70.0278, 85.09) -> (91.0706, 85.09)
  line L20 (91.0706, 85.09) -> (91.0706, 81.28)
  line L21 (91.0706, 81.28) -> (70.0278, 81.28)
  line L22 (70.0278, 81.28) -> (70.0278, 85.09)
  point P0 (-28.575, 152.4)
  point P1 (87.9854, 81.28)
  point P2 (87.9854, 85.09)
extrude "Extrusion20" cut sketch "Sketch20" against normal blind 1.27 contours L19 A0 L21 L1
sketch "Sketch21" plane through (-122.499, -152.4, 138.43) normal (1, 0, 0) x (0, 0, -1)
  line L0 (38.5572, 85.09) -> (39.8272, 85.09) projected
  line L1 (39.8272, 154.305) -> (39.8272, 85.09) projected
  line L2 (109.855, 154.305) -> (39.8272, 154.305) projected
  line L3 (109.855, 154.305) -> (109.855, 166.37) projected
  line L4 (0, 166.37) -> (109.855, 166.37) projected
  line L5 (0, 154.4562) -> (0, 166.37) projected
  line L6 (32.296, 154.4562) -> (0, 154.4562) projected
  line L7 (32.296, 90.805) -> (32.296, 154.4562) projected
  line L8 (20.7004, 90.805) -> (32.296, 90.805) projected
  arc A0 (20.7004, 75.565) -> (20.7004, 90.805) centre (-1.994, 83.185) ccw projected
  line L9 (32.296, 75.565) -> (20.7004, 75.565) projected
  line L10 (32.296, 12.065) -> (32.296, 75.565) projected
  line L11 (0, 12.065) -> (32.296, 12.065) projected
  line L12 (0, 0) -> (0, 12.065) projected
  line L13 (109.855, 0) -> (0, 0) projected
  line L14 (109.855, 0) -> (109.855, 12.065) projected
  line L15 (39.8272, 12.065) -> (109.855, 12.065) projected
  line L16 (39.8272, 81.28) -> (39.8272, 12.065) projected
  line L17 (39.8272, 81.28) -> (38.5572, 81.28) projected
  line L18 (38.5572, 81.28) -> (38.5572, 85.09) projected
  line L19 (39.8272, 81.28) -> (20.7004, 81.28)
  line L20 (20.7004, 81.28) -> (20.7004, 85.09)
  line L21 (20.7004, 85.09) -> (39.8272, 85.09)
  line L22 (39.8272, 85.09) -> (39.8272, 81.28)
  point P0 (138.43, 152.4)
  point P1 (21.8696, 85.09)
  point P2 (21.8696, 81.28)
extrude "Extrusion21" cut sketch "Sketch21" against normal blind 1.27 contours L18 L19 A0 L21
sketch "Sketch22" plane through (-90.114, 13.97, 161.925) normal (1, 0, 0) x (0, 0, -1)
  line L0 (194.945, -81.28) -> (194.945, -41.5925) projected
  line L1 (0, 0) -> (0, -81.28) projected
  line L2 (175.895, -166.37) -> (0, -166.37) projected
  line L3 (0, 0) -> (175.895, 0) projected
  point P0 (161.925, -13.97)
  dimension "d106" = 194.945
  dimension "d107" = 166.37
sketch "Sketch23" plane through (0, 13.97, 0) normal (0, 1, 0) x (1, 0, 0)
  line L0 (-133.294, 13.97) -> (-133.294, -161.925) projected
  line L1 (-90.114, -161.925) -> (-90.114, 13.97) projected
  point P0 (0, 0)
  dimension "d108" = 43.18
properties part number "mid side peici"
